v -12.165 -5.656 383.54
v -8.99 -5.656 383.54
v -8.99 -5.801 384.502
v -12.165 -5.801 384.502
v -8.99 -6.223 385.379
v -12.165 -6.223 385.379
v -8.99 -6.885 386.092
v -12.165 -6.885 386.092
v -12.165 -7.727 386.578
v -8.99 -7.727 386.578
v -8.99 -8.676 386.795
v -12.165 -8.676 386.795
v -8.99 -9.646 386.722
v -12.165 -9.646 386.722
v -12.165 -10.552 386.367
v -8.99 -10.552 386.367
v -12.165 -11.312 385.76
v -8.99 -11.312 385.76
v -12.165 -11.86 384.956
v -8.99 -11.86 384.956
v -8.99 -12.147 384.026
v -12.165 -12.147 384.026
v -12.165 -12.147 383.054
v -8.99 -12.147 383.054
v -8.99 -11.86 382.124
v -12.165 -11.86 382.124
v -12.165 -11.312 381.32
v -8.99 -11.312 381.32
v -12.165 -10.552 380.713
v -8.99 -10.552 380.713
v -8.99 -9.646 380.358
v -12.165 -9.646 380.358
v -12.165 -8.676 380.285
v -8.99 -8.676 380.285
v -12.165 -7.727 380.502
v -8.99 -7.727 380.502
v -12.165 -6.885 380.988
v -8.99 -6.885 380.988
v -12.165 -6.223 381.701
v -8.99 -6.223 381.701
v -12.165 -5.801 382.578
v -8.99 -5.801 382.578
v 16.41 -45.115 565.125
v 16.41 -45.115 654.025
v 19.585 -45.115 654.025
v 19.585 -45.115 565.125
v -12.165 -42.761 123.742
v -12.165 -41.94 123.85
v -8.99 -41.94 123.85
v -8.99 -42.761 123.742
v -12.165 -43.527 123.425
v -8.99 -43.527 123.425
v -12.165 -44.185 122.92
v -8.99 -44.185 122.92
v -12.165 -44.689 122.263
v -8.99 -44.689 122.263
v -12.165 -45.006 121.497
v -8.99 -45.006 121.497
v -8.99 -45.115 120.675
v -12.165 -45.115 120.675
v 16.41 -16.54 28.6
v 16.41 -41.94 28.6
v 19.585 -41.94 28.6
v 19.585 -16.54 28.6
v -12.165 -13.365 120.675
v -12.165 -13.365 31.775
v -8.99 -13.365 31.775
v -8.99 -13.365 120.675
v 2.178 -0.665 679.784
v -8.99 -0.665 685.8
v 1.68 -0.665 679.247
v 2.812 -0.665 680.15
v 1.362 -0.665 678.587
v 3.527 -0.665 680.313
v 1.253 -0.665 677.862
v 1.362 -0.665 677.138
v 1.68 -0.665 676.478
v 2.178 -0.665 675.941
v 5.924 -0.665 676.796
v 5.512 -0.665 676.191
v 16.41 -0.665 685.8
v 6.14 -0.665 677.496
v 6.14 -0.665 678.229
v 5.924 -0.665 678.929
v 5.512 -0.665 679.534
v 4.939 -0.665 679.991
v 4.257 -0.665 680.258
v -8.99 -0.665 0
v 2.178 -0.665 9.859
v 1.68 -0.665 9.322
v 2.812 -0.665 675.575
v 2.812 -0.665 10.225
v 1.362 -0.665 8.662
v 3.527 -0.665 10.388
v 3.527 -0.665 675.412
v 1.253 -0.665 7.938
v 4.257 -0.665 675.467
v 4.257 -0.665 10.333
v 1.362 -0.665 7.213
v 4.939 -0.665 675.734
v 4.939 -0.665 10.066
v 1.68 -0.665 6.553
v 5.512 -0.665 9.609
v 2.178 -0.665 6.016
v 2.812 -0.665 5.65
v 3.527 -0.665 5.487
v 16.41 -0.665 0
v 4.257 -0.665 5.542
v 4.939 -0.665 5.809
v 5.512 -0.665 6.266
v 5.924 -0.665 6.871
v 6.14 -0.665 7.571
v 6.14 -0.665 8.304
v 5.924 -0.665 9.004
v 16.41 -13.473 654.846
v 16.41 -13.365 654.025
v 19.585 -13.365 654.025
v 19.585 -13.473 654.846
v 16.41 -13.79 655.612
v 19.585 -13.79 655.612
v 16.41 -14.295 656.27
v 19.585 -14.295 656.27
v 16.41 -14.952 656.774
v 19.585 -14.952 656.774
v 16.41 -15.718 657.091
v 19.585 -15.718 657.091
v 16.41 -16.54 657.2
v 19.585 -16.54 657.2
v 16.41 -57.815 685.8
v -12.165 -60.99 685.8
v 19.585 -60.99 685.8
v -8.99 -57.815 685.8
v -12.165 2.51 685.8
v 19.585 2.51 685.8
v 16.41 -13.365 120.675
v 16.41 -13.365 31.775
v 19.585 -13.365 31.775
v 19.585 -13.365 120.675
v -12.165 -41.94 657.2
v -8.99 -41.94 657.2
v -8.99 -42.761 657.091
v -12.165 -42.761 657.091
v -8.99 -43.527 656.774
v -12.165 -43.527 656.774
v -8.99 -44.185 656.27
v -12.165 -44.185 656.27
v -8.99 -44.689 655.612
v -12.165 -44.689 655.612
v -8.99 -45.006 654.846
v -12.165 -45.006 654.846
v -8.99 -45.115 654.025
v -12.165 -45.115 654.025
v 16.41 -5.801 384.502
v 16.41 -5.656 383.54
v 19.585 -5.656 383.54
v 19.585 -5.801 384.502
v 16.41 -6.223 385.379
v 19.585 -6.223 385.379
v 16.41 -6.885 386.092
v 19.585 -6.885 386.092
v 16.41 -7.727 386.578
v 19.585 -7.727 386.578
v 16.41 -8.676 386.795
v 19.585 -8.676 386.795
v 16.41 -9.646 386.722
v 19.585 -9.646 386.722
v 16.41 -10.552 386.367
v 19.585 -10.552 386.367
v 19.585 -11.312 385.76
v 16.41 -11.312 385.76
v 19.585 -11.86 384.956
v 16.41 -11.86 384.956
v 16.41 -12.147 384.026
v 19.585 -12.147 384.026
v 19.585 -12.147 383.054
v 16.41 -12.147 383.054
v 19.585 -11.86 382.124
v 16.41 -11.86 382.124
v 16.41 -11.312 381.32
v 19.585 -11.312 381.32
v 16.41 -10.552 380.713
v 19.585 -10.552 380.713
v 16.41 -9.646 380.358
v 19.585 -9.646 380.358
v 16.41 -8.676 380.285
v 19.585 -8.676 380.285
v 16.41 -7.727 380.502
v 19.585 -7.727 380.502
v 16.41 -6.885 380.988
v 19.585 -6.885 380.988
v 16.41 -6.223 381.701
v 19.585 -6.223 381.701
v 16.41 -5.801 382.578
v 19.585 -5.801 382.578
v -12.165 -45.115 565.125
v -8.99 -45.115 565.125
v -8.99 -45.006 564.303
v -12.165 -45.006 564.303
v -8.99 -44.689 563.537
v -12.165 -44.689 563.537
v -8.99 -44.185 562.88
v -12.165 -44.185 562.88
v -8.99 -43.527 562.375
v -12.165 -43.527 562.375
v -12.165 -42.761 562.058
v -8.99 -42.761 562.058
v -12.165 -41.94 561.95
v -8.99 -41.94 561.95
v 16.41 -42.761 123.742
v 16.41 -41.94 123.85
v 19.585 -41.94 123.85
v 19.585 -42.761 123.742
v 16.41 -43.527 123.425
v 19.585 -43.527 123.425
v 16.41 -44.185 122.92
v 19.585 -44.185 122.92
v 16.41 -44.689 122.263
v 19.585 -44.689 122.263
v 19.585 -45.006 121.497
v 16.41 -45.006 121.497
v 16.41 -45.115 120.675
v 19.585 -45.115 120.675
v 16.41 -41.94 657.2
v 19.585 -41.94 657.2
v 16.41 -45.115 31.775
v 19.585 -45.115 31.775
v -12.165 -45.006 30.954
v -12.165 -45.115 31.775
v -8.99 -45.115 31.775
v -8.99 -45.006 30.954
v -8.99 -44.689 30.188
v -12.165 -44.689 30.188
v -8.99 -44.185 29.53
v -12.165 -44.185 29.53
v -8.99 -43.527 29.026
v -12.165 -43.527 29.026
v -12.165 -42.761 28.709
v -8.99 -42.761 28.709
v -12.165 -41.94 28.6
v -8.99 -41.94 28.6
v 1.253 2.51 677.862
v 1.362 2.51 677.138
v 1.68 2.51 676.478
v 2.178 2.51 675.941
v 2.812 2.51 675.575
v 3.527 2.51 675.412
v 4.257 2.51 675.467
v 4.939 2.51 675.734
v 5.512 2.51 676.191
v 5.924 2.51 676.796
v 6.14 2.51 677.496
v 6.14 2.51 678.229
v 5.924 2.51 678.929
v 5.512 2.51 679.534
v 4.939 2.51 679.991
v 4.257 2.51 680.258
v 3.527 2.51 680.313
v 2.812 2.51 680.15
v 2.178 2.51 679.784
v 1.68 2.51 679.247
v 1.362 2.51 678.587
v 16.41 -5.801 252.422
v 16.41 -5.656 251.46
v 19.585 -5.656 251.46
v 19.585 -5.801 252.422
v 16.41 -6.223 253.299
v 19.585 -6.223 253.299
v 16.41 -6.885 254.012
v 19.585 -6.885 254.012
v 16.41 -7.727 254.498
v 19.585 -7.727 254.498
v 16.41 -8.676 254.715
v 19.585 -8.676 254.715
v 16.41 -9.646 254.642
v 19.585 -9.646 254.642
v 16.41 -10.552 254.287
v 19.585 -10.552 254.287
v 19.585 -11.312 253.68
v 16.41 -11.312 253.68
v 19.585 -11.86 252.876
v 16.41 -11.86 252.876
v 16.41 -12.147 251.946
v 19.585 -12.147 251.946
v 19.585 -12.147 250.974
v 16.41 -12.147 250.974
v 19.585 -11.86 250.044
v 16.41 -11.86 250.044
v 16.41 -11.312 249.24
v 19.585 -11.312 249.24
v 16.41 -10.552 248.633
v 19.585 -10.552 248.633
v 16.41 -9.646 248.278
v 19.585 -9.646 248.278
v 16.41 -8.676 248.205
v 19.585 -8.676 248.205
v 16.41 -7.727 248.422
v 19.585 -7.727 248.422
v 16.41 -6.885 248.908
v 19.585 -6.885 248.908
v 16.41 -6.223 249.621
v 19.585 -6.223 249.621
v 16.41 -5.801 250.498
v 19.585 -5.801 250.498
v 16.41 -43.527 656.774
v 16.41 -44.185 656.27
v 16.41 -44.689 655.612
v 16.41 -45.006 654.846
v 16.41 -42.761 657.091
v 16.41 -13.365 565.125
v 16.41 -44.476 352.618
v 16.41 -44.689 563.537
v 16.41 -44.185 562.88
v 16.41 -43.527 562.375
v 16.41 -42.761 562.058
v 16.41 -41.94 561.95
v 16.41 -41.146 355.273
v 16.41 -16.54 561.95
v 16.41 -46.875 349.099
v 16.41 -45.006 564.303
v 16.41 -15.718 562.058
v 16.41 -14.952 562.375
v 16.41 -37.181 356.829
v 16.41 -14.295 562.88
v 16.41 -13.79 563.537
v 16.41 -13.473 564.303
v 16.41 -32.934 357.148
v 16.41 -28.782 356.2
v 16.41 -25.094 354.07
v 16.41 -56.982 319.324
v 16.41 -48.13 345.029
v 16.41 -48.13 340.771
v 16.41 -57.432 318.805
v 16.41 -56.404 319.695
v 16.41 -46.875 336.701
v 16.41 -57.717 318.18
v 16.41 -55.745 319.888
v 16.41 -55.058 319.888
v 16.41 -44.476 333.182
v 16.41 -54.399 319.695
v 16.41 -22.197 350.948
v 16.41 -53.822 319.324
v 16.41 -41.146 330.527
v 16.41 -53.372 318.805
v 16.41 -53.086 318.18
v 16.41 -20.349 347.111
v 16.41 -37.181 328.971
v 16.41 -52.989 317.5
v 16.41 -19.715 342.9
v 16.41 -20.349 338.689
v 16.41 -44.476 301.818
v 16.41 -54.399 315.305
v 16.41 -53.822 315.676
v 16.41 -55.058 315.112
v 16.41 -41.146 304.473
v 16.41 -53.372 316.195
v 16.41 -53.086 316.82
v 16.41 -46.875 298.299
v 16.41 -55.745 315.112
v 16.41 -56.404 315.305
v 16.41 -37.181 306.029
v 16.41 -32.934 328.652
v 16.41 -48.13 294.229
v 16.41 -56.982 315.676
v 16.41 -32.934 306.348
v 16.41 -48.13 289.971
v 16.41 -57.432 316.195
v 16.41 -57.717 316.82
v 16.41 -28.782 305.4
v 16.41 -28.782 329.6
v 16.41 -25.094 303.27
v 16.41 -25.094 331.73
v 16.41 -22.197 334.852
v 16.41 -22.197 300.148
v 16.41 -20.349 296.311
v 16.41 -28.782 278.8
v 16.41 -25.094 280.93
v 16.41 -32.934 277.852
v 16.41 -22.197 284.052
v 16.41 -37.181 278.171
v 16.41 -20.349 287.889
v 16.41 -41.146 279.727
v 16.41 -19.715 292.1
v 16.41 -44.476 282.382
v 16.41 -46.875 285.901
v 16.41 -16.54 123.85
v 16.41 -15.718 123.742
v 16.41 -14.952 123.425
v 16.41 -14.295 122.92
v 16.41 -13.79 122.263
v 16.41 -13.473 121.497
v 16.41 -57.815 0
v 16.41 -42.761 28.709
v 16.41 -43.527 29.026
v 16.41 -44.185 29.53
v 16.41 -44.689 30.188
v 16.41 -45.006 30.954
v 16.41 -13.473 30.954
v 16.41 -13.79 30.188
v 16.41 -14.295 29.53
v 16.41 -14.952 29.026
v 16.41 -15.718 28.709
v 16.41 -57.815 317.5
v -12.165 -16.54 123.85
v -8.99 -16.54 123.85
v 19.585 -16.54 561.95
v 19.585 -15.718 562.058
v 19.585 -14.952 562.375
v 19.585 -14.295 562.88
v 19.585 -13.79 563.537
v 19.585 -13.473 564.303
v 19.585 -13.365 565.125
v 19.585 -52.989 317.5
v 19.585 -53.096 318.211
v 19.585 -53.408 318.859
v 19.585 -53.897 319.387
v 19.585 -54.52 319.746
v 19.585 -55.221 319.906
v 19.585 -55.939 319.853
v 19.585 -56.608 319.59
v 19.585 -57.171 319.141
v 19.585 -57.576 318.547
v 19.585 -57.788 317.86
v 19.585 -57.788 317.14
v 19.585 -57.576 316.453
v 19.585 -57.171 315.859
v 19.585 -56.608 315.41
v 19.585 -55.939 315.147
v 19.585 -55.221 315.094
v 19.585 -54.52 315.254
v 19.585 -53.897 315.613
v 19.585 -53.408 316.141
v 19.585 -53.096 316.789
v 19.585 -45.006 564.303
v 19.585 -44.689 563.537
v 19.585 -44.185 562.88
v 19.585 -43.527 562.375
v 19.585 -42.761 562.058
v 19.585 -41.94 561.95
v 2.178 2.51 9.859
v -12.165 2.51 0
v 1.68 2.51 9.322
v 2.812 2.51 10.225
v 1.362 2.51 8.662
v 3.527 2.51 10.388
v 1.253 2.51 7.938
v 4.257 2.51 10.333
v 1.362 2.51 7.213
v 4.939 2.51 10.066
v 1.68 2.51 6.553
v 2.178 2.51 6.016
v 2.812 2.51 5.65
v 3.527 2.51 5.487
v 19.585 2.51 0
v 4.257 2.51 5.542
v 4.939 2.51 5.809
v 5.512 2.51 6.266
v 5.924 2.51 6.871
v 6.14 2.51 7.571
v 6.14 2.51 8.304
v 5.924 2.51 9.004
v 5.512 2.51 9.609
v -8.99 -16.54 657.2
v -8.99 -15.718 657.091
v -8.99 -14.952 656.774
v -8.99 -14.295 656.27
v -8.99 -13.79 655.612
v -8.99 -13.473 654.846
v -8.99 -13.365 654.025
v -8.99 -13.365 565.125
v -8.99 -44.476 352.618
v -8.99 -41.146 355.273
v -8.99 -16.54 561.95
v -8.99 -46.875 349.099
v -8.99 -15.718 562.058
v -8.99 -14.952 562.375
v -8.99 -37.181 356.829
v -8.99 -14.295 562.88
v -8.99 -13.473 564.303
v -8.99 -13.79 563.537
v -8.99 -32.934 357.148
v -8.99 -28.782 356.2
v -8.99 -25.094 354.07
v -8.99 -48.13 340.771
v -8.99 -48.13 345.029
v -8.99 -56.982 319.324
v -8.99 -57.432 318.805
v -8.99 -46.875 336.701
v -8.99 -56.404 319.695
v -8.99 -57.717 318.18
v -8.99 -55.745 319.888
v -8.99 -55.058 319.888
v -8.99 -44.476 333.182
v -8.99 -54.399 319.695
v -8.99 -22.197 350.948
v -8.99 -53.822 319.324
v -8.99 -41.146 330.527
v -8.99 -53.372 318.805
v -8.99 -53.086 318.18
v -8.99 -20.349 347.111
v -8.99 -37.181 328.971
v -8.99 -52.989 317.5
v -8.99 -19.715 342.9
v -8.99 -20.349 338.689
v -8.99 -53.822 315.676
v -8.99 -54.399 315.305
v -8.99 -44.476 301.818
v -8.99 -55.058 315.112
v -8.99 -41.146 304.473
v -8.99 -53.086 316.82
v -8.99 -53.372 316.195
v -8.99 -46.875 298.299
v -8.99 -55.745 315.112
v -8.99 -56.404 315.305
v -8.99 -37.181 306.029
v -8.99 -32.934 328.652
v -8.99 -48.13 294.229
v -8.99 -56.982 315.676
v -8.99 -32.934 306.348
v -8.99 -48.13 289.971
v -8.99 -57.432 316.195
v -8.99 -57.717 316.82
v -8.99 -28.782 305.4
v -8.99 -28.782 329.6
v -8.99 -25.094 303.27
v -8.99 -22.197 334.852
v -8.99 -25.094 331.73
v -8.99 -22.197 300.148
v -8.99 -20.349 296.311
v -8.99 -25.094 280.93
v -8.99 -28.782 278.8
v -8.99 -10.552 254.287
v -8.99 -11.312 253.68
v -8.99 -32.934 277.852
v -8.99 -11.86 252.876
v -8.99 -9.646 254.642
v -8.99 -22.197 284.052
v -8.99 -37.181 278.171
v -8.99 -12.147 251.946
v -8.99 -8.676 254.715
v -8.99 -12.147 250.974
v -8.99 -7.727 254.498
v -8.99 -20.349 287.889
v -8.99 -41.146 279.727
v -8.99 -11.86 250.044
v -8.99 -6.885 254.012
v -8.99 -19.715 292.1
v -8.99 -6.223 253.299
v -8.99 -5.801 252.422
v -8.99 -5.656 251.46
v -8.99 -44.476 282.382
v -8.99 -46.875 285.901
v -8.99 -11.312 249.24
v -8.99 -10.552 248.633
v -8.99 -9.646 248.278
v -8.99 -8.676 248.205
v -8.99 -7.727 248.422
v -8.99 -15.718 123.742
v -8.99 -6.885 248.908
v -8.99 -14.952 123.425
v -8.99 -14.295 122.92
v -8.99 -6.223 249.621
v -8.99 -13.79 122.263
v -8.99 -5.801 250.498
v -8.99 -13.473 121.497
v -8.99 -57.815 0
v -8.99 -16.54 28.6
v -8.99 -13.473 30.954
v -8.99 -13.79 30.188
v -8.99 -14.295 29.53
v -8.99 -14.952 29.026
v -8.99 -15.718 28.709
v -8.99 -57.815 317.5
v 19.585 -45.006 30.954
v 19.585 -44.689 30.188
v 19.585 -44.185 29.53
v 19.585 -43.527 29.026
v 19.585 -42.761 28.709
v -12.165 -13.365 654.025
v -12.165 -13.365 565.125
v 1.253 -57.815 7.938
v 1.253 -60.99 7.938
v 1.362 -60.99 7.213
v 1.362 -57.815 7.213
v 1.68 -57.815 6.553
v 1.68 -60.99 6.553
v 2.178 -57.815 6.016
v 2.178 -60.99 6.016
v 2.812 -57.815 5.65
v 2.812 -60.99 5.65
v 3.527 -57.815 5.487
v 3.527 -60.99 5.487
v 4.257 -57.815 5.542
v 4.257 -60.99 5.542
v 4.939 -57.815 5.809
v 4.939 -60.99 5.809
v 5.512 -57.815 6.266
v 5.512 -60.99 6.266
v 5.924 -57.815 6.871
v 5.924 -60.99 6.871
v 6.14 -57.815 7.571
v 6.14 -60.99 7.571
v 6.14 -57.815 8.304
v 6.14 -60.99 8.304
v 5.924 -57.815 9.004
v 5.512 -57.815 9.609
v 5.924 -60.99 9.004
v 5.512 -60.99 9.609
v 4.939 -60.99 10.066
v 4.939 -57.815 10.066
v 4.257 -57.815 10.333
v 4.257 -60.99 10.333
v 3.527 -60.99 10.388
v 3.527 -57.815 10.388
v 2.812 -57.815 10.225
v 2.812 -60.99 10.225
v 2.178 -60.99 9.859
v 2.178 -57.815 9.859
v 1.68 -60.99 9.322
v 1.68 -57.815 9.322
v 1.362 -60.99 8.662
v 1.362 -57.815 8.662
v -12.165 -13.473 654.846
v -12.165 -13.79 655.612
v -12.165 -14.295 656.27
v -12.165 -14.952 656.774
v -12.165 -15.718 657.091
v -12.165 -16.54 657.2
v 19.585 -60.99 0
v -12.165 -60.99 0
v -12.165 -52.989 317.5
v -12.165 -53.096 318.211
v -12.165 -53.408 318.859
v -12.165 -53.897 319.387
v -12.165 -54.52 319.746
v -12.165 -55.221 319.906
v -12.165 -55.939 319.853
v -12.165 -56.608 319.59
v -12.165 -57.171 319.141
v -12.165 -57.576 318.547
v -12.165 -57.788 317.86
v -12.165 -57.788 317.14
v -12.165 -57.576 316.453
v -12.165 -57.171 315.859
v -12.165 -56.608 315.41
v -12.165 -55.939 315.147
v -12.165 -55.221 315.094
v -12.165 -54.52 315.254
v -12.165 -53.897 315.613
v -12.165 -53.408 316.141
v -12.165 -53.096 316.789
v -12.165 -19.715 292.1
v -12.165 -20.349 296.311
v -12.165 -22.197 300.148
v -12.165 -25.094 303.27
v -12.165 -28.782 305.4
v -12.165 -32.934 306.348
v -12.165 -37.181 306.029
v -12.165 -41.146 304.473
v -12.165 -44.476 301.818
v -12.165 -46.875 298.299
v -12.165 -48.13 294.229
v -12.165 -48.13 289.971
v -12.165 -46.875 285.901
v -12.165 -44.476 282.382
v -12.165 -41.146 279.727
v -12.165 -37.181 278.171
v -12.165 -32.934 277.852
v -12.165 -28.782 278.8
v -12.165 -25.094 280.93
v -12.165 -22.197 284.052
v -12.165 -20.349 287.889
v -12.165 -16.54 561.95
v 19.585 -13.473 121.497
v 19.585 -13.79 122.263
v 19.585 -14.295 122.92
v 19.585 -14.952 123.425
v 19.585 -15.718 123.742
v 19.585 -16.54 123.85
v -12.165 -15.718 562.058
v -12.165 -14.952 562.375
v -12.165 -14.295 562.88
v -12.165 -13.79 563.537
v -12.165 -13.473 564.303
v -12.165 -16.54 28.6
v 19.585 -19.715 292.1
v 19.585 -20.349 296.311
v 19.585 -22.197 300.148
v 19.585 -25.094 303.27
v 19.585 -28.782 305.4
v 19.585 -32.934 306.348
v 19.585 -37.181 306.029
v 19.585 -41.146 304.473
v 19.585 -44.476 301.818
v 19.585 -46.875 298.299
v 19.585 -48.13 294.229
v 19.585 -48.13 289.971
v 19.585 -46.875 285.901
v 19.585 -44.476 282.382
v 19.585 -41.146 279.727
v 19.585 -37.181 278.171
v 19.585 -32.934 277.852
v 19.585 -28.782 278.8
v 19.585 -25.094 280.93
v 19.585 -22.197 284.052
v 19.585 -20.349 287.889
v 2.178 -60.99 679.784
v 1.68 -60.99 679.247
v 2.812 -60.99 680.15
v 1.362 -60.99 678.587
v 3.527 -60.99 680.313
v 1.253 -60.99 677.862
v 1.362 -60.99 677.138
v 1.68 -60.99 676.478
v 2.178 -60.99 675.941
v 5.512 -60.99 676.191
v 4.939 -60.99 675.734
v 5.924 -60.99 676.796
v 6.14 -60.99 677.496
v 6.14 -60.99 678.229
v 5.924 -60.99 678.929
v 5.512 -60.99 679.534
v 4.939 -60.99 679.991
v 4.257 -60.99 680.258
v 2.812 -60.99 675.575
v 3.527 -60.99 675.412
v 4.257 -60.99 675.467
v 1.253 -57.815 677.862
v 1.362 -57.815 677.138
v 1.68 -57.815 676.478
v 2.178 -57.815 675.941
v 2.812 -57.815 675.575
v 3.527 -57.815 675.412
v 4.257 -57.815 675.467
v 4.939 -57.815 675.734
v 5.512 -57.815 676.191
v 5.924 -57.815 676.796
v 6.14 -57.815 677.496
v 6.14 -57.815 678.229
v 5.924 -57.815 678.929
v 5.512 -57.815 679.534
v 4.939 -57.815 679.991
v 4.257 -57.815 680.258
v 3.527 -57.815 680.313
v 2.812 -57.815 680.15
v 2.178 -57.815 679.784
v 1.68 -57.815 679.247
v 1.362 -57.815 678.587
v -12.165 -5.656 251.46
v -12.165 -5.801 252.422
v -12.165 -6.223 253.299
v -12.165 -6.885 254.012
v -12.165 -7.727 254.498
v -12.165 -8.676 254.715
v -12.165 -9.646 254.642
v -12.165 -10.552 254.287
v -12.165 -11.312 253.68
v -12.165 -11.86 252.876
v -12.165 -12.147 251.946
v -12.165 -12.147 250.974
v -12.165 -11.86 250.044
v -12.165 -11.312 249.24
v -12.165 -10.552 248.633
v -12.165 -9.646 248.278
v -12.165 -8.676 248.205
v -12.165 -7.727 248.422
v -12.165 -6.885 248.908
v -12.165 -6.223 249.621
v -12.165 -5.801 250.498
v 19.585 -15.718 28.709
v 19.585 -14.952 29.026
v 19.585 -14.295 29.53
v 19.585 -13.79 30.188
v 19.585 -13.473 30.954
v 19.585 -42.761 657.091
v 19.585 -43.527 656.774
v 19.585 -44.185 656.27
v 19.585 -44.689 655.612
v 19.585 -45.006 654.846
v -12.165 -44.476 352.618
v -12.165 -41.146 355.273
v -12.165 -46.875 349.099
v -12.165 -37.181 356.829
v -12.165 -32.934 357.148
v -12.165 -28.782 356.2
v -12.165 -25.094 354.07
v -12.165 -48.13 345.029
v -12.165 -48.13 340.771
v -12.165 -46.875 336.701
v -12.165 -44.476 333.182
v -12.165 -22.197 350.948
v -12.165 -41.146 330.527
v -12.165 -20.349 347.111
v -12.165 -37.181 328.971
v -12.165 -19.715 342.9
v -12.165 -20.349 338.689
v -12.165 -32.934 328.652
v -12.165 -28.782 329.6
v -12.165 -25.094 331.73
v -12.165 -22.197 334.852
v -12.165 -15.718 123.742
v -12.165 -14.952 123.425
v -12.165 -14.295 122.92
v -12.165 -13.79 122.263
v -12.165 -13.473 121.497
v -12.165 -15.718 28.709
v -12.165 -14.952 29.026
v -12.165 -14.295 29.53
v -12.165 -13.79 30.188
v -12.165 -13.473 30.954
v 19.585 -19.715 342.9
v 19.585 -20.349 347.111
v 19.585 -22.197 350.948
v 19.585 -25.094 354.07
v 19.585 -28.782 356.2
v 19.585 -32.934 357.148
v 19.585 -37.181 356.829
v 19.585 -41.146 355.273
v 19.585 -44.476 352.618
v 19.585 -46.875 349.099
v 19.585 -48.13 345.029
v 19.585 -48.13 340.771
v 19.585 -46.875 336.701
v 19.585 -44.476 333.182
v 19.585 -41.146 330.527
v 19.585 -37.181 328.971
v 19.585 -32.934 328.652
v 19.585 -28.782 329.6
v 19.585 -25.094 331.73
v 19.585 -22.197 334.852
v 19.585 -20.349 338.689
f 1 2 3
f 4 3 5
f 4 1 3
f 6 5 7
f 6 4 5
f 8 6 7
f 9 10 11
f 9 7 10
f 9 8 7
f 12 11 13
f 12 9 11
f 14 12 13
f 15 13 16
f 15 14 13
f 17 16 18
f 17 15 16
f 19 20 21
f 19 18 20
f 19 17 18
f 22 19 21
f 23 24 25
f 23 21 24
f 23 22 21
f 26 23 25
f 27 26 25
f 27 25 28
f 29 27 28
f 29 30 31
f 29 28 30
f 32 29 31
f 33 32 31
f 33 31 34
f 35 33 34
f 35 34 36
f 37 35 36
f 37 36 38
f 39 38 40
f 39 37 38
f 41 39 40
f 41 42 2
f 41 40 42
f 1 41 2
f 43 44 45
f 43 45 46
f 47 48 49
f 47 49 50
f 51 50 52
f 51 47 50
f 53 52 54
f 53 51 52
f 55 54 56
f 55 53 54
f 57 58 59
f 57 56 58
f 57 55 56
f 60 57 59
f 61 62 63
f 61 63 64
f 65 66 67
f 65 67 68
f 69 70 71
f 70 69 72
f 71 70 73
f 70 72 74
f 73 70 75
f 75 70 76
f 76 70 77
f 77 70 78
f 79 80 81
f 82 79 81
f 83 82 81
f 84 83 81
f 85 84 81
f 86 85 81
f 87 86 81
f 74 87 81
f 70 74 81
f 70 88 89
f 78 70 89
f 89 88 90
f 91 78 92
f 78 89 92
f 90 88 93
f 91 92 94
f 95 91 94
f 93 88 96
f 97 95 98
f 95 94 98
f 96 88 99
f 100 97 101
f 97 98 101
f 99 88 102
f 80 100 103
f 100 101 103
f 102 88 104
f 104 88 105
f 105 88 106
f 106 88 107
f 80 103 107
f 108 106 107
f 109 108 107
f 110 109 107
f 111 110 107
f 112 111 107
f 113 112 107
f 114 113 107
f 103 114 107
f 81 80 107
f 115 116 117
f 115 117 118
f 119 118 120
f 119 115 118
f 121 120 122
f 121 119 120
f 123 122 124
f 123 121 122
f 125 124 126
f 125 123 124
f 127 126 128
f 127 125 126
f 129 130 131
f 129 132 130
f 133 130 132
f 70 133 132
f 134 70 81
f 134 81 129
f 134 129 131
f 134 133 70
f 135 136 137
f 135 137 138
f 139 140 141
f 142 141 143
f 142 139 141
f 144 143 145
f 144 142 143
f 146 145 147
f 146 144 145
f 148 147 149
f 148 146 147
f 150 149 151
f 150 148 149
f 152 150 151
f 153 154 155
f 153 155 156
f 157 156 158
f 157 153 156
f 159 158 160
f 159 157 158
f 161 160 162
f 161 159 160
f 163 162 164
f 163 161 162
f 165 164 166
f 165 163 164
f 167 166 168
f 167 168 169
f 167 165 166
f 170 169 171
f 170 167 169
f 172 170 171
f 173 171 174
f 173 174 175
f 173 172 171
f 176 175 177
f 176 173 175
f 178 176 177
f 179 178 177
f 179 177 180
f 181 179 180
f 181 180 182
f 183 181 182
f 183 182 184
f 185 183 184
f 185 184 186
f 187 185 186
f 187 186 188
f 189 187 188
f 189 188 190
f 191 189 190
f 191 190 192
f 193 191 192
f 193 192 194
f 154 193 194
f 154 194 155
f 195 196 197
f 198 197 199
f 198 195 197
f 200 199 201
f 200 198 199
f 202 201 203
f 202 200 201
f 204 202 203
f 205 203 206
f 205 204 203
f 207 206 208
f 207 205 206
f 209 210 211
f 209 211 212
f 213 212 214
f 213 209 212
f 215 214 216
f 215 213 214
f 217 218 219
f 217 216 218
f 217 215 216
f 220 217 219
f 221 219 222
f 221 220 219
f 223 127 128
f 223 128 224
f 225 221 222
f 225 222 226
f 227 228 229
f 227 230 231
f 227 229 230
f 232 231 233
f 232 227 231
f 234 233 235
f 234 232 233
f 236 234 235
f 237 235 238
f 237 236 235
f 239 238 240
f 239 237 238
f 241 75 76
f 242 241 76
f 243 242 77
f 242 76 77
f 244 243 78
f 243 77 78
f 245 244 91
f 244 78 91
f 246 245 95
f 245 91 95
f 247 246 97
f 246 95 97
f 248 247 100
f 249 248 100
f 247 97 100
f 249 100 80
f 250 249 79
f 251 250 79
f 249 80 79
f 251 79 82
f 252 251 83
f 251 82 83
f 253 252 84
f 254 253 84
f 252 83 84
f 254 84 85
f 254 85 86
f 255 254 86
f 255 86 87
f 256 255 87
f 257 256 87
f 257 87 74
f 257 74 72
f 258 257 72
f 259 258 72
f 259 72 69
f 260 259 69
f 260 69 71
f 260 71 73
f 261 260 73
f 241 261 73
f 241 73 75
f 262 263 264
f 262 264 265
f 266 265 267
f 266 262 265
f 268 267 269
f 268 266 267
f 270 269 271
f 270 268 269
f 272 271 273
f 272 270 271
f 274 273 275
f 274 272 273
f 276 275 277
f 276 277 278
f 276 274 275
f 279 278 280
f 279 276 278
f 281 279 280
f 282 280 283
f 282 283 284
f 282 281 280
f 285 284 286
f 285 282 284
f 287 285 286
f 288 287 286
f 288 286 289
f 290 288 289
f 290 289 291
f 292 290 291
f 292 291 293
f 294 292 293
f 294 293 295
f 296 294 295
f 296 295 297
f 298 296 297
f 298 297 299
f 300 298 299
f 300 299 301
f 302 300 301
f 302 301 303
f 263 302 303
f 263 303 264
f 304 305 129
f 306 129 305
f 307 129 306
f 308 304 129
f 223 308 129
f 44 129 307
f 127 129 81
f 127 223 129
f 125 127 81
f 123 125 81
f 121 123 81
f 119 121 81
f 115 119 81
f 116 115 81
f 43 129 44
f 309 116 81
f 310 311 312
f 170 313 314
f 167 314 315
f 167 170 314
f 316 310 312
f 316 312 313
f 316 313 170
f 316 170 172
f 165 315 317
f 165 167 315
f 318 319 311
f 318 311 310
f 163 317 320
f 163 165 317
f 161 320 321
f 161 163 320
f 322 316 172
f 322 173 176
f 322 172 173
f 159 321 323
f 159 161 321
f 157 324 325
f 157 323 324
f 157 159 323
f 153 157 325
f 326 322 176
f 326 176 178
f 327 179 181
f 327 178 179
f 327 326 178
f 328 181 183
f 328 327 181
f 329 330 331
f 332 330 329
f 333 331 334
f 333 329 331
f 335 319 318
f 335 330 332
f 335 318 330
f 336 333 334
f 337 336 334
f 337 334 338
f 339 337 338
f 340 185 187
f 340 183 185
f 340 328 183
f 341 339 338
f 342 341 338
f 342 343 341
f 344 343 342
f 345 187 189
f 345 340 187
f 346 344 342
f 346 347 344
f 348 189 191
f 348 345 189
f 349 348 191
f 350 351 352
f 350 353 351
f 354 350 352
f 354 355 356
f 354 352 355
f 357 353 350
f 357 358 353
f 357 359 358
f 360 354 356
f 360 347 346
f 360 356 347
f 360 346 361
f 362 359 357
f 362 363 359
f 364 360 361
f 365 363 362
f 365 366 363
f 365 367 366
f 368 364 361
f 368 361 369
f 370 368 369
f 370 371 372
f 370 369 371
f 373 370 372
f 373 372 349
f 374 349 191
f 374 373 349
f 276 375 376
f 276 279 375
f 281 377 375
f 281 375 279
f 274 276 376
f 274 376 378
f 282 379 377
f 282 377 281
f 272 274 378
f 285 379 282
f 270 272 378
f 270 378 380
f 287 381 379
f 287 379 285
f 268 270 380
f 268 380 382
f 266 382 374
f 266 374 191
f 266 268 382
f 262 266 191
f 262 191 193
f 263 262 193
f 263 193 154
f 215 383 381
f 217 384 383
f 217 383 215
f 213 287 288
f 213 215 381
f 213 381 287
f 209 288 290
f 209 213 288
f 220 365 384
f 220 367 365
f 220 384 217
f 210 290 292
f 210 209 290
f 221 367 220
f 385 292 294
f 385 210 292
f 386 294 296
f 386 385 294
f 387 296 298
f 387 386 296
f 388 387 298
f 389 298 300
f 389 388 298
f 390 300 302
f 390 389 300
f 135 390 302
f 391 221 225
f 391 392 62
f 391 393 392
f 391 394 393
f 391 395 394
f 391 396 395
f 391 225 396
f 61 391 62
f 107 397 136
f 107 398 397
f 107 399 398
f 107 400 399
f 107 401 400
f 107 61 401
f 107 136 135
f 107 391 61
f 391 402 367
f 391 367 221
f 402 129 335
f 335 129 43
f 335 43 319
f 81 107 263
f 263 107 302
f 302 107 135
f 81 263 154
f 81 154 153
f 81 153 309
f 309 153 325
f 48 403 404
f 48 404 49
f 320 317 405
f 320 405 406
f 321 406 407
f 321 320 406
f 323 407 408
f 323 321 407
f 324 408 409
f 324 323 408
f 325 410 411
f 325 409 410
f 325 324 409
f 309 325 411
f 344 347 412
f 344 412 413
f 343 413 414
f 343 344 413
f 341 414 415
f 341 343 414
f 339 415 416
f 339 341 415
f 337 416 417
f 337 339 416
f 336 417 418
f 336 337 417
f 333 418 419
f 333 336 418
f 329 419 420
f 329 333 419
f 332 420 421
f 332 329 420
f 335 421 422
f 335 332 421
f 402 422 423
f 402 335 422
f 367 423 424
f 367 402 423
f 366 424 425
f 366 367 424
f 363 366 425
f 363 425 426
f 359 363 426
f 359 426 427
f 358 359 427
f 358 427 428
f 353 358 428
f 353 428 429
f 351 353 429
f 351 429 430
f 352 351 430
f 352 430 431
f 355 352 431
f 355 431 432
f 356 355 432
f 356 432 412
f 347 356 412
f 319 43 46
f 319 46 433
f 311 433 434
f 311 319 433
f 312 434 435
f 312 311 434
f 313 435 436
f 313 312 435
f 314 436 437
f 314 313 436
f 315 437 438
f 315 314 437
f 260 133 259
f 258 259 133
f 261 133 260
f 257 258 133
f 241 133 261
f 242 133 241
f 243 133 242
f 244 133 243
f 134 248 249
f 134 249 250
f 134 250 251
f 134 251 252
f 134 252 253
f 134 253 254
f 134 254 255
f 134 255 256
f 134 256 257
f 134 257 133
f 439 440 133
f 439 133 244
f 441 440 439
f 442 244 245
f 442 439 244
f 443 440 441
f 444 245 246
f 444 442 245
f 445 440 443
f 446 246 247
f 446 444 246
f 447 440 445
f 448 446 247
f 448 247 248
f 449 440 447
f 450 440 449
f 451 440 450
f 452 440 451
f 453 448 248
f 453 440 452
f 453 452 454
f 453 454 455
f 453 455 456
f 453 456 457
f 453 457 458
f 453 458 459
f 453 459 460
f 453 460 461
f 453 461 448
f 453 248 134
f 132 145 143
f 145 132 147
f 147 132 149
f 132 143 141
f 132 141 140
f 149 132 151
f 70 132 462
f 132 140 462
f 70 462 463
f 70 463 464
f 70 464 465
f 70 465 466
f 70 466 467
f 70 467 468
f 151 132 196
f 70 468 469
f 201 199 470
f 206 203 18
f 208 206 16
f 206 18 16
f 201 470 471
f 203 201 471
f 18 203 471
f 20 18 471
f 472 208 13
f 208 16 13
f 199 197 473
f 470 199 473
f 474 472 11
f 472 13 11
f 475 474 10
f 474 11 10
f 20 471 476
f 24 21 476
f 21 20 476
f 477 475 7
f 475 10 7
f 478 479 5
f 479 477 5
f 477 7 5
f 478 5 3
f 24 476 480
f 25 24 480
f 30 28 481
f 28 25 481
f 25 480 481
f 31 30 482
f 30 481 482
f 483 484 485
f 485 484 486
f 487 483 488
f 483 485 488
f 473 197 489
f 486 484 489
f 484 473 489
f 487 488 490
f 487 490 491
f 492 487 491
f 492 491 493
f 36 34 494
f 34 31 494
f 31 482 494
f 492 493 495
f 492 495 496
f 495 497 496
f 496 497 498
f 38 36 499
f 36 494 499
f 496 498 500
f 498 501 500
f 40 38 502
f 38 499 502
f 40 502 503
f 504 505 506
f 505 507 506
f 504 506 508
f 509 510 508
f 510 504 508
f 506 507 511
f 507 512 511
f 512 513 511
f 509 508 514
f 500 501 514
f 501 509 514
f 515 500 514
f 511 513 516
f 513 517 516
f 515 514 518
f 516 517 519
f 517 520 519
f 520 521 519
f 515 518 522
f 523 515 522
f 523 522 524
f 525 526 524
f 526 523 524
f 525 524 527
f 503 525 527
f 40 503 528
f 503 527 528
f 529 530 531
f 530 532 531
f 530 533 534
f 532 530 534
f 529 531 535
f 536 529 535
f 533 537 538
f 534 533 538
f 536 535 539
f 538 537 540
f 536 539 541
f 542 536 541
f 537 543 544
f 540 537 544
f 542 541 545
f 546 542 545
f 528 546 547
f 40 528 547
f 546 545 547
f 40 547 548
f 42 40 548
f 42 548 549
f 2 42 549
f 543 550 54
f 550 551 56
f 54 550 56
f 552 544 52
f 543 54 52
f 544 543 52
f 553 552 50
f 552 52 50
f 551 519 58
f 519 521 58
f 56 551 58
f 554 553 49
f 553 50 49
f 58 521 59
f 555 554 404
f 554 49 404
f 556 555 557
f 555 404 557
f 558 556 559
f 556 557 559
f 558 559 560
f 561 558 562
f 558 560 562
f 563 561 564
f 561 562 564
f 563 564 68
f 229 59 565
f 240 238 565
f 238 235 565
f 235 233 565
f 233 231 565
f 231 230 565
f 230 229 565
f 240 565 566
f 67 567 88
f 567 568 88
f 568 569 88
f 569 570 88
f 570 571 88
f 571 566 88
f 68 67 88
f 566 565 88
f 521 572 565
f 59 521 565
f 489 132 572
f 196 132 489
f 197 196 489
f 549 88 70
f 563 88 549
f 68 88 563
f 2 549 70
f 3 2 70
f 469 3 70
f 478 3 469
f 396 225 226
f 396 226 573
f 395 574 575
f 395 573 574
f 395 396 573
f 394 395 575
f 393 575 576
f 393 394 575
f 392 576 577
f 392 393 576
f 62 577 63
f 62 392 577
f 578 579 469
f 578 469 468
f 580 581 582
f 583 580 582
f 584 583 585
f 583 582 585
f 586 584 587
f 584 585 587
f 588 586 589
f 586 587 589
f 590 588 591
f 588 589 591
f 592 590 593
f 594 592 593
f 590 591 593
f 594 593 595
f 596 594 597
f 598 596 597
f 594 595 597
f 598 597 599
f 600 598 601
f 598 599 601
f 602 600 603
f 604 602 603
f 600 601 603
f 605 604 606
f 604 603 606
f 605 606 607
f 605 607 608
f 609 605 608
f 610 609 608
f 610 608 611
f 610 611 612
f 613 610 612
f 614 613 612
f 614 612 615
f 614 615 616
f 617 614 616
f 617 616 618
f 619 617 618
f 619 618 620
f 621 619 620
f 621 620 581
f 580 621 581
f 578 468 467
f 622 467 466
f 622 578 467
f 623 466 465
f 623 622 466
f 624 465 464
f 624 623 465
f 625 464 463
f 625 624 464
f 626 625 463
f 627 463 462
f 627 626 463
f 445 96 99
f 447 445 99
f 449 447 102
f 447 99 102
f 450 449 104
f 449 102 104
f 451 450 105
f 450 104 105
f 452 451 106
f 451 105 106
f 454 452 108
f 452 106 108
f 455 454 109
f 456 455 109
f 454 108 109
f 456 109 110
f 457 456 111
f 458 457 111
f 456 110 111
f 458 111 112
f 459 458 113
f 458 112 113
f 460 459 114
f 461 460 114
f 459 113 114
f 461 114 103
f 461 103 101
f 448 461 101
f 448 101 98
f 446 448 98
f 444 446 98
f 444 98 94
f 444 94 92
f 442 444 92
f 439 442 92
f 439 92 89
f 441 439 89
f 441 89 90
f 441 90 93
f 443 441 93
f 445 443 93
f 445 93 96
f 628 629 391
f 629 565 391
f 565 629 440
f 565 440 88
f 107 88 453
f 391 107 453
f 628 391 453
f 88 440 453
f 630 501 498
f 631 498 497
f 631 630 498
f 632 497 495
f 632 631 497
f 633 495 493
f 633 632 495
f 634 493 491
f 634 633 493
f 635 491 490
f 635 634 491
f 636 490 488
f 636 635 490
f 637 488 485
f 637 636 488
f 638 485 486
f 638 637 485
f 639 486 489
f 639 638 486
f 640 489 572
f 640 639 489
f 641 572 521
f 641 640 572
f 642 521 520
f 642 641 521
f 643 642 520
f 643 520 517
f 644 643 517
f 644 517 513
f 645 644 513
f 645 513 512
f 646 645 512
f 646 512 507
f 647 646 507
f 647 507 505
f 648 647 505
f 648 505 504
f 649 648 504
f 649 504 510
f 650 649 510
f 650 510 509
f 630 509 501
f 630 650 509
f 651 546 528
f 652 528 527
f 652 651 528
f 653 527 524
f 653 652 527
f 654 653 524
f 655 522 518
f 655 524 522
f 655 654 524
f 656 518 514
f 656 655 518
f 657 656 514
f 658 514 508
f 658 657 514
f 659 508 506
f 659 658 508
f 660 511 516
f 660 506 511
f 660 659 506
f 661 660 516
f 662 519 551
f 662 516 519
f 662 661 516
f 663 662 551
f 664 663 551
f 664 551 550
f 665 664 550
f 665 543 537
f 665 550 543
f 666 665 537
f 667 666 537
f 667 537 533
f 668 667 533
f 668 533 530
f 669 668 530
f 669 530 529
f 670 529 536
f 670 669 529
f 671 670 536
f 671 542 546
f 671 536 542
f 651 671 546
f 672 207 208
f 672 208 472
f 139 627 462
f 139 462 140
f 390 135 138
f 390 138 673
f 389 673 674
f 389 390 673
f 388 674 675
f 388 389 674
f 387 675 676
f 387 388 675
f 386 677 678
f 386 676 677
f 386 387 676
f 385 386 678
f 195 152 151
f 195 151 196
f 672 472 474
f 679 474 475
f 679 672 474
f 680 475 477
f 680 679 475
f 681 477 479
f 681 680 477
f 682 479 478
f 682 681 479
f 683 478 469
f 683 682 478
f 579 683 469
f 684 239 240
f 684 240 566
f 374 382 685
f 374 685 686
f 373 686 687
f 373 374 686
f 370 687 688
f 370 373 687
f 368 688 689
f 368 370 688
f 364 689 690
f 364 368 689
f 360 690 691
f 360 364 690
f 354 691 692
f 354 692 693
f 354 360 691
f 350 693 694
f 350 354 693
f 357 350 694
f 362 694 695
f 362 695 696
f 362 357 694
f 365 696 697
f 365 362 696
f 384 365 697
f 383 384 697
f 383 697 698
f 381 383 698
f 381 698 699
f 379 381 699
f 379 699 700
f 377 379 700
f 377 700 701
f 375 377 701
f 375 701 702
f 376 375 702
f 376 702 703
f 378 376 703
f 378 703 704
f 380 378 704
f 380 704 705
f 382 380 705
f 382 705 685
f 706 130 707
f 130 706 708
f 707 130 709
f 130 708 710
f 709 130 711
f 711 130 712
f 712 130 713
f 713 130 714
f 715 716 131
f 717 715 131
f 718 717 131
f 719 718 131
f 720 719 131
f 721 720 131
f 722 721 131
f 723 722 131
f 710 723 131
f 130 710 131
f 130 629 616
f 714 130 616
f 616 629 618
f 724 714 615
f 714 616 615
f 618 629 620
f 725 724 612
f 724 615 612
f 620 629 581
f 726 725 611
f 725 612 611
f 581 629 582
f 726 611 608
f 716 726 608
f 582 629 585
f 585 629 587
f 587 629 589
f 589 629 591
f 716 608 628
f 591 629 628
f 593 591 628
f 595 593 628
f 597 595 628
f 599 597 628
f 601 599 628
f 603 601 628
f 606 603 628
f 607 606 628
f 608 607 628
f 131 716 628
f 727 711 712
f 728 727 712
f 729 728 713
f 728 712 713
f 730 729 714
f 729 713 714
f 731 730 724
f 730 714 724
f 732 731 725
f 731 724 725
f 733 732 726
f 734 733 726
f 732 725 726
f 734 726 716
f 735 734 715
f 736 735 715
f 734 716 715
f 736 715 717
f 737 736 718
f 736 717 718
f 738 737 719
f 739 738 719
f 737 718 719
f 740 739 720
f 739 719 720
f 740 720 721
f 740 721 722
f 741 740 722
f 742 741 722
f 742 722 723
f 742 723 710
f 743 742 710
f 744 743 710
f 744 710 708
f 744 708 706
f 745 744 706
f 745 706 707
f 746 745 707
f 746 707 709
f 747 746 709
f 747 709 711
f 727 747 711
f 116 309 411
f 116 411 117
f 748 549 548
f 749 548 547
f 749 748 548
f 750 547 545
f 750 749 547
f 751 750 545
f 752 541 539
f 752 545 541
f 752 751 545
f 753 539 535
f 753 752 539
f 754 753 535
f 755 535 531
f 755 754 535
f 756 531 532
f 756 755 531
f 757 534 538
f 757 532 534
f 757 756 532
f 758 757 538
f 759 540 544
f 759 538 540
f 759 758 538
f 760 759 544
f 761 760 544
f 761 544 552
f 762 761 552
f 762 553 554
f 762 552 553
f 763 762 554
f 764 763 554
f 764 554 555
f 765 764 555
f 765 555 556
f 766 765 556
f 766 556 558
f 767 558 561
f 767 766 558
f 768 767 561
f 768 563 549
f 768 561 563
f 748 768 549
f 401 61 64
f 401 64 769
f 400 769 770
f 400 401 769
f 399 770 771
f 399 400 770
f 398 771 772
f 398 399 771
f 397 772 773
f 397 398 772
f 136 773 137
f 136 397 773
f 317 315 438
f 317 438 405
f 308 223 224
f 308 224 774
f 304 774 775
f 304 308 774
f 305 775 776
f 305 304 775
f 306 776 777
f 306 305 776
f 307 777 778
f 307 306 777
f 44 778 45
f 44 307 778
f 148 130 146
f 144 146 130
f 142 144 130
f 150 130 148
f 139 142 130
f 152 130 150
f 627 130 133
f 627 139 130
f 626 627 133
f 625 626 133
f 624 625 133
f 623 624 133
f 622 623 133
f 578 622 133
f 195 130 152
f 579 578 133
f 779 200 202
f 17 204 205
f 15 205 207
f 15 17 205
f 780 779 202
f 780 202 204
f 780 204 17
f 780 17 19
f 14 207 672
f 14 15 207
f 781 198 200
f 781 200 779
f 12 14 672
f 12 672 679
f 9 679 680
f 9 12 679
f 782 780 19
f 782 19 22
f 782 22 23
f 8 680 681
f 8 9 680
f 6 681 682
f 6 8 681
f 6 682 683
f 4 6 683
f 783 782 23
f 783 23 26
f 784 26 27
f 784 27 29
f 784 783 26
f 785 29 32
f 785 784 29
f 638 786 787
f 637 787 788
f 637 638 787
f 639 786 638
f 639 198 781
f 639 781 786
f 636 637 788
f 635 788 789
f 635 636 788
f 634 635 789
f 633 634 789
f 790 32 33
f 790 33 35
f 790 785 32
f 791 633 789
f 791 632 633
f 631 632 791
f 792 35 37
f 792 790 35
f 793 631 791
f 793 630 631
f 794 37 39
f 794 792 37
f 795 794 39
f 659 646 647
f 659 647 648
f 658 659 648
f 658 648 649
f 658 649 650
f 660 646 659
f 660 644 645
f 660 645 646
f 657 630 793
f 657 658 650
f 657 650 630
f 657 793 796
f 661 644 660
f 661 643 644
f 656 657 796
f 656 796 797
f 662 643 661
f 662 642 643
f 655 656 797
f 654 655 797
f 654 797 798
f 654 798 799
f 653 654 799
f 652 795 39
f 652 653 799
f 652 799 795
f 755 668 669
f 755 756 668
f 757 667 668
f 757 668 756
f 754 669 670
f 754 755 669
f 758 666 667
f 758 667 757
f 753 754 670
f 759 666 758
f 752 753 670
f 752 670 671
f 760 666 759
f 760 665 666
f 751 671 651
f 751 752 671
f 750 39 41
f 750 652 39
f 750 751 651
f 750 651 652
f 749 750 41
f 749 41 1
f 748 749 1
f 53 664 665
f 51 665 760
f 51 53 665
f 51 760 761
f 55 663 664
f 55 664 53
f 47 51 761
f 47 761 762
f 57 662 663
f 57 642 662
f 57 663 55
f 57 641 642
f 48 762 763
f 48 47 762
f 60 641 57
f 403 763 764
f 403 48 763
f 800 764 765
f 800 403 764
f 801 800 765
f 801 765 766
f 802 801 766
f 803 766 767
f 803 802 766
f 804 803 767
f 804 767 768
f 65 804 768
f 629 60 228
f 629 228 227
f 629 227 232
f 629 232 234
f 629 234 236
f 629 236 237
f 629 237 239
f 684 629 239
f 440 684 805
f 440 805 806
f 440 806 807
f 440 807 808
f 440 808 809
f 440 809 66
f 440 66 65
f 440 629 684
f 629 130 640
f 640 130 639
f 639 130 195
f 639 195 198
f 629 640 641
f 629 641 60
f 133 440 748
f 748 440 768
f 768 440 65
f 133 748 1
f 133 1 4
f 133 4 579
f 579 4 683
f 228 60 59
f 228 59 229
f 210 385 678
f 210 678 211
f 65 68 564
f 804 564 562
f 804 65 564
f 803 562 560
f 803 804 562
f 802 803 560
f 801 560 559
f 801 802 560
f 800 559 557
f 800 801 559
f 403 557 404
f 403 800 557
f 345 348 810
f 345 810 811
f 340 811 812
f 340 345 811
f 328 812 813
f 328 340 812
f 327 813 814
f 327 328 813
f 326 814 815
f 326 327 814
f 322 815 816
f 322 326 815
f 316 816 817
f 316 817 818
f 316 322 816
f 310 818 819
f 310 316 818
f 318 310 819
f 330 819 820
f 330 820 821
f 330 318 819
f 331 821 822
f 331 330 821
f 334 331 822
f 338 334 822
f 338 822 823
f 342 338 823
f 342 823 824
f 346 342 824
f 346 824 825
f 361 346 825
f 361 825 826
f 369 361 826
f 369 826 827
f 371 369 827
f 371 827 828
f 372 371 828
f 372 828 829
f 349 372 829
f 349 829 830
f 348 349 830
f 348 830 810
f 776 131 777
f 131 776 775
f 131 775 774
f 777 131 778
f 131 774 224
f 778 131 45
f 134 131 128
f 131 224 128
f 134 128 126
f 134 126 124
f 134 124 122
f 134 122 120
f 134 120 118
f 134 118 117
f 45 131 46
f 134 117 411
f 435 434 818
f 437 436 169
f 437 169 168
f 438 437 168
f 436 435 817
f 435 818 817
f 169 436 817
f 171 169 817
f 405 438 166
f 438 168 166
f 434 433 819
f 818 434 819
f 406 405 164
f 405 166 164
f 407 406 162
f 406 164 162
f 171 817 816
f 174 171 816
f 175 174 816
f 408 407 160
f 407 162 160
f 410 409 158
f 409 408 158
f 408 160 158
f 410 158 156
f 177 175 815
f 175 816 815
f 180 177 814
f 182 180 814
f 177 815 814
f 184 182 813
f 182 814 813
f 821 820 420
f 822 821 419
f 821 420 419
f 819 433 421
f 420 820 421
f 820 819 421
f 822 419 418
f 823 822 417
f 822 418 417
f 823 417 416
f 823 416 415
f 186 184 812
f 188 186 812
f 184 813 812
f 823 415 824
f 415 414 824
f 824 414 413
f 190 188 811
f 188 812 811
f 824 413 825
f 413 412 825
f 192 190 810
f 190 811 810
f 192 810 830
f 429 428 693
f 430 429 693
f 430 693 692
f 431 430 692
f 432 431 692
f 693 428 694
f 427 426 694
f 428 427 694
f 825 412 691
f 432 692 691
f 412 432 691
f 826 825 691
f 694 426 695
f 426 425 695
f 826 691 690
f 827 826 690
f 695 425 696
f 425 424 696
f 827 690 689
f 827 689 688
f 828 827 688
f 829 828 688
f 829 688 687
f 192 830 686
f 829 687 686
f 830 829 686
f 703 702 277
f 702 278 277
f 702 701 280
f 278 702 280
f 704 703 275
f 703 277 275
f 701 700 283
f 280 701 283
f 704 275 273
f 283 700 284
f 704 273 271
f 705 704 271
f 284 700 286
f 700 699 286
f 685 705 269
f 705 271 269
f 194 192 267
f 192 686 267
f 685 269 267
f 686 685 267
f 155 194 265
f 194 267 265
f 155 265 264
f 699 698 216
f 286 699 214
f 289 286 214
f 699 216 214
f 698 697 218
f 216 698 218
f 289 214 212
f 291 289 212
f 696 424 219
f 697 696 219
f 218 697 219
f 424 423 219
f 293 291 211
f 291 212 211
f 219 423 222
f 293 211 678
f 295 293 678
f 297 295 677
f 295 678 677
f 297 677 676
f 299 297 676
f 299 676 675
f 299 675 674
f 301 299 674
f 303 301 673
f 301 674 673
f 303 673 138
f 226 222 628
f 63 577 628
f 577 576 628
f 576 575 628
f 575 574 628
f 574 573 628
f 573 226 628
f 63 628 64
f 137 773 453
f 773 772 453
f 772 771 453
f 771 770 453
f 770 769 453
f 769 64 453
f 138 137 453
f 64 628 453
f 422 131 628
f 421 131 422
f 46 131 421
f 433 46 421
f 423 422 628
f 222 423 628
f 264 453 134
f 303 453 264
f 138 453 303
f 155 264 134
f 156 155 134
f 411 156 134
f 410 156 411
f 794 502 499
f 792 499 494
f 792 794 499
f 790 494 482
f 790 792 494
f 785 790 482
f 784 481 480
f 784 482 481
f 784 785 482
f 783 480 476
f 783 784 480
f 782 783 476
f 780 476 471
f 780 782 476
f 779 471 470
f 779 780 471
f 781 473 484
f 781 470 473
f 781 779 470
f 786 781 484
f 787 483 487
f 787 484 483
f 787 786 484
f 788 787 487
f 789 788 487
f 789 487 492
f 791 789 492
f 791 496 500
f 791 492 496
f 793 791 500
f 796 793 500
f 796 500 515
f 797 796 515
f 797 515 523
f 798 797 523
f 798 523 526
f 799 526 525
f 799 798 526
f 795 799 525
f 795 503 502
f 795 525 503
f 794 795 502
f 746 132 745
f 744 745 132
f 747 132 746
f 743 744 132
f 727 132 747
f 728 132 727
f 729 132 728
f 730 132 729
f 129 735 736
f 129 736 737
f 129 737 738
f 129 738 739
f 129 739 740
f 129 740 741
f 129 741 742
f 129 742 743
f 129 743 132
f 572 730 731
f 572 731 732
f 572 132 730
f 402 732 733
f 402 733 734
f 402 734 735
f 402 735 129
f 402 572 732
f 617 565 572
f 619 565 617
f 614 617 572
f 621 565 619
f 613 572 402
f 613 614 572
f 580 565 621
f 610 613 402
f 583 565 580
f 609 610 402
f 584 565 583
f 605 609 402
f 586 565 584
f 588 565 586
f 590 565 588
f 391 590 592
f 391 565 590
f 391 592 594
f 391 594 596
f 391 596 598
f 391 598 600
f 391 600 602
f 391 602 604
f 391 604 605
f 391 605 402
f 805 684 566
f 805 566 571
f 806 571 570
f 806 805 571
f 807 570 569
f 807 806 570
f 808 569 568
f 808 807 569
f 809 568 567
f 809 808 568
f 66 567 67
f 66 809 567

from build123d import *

# Parameters (mm, degrees)
SKETCH1_W                    = 31.75
SKETCH1_H                    = 63.5
SKETCH1_W_2                  = 25.4
SKETCH1_H_2                  = 57.15
BOSS_EXTRUDE1_DEPTH          = 685.8
CUT_EXTRUDE1_REACH           = 691.238
F_10_0_1935_DIAMETER_HOLE1_D = 4.9149
CUT_EXTRUDE2_START           = -31.75
SKETCH6_R                    = 14.2875
SKETCH6_R_2                  = 3.2639
SKETCH6_R_3                  = 2.413
CUT_EXTRUDE2_DEPTH           = 31.75


with BuildPart() as part:
    # Sketch1 → Boss-Extrude1 (new body)
    with BuildSketch(Plane.XY):
        with Locations((3.710272719, -29.23968021)):
            Rectangle(SKETCH1_W, SKETCH1_H)
        with Locations((3.710272719, -29.23968021)):
            Rectangle(SKETCH1_W_2, SKETCH1_H_2, mode=Mode.SUBTRACT)
    extrude(amount=BOSS_EXTRUDE1_DEPTH)

    # Cut-Extrude1: up to this face of the body (flat: up to its plane)
    cut_extrude1_end = Plane(part.part.faces().sort_by_distance((19.585272719, -29.23968021, 342.9))[0])
    # Sketch3 → Cut-Extrude1 (cut, up to the picked face)
    with BuildSketch(Plane.ZY.offset(12.164727281), mode=Mode.PRIVATE) as cut_extrude1_sk1:
        with BuildLine():
            Line((31.7754, -13.36468021), (120.6754, -13.36468021))
            ThreePointArc((120.6754, -13.36468021), (122.92046403, -14.294616179), (123.8504, -16.53968021))
            Line((123.8504, -16.53968021), (123.8504, -41.93968021))
            ThreePointArc((123.8504, -41.93968021), (122.92046403, -44.18474424), (120.6754, -45.11468021))
            Line((120.6754, -45.11468021), (31.7754, -45.11468021))
            ThreePointArc((31.7754, -45.11468021), (29.53033597, -44.18474424), (28.6004, -41.93968021))
            Line((28.6004, -41.93968021), (28.6004, -16.53968021))
            ThreePointArc((28.6004, -16.53968021), (29.53033597, -14.294616179), (31.7754, -13.36468021))
        make_face()
    cut_extrude1_tool1 = split(extrude(cut_extrude1_sk1.sketch, amount=-CUT_EXTRUDE1_REACH, mode=Mode.PRIVATE), bisect_by=cut_extrude1_end, keep=Keep.BOTH, mode=Mode.PRIVATE)
    # Sketch3 → Cut-Extrude1 (cut, up to the picked face)
    with BuildSketch(Plane.ZY.offset(12.164727281), mode=Mode.PRIVATE) as cut_extrude1_sk2:
        with BuildLine():
            ThreePointArc((657.1996, -41.93968021), (656.26966403, -44.18474424), (654.0246, -45.11468021))
            Line((654.0246, -45.11468021), (565.1246, -45.11468021))
            ThreePointArc((565.1246, -45.11468021), (562.87953597, -44.18474424), (561.9496, -41.93968021))
            Line((561.9496, -41.93968021), (561.9496, -16.53968021))
            ThreePointArc((561.9496, -16.53968021), (562.87953597, -14.294616179), (565.1246, -13.36468021))
            Line((565.1246, -13.36468021), (654.0246, -13.36468021))
            ThreePointArc((654.0246, -13.36468021), (656.26966403, -14.294616179), (657.1996, -16.53968021))
            Line((657.1996, -16.53968021), (657.1996, -41.93968021))
        make_face()
    cut_extrude1_tool2 = split(extrude(cut_extrude1_sk2.sketch, amount=-CUT_EXTRUDE1_REACH, mode=Mode.PRIVATE), bisect_by=cut_extrude1_end, keep=Keep.BOTH, mode=Mode.PRIVATE)
    add(cut_extrude1_tool1.solids().sort_by(Axis((-12.164727, -29.23968, 76.2254), (1, 0, 0)))[0], mode=Mode.SUBTRACT)
    add(cut_extrude1_tool2.solids().sort_by(Axis((-12.164727, -29.23968, 609.5746), (1, 0, 0)))[0], mode=Mode.SUBTRACT)

    # #10 (0.1935) Diameter Hole1 (through all)
    with Locations(Plane(origin=(3.710272719, 2.51031979, 677.8625), x_dir=(1, 0, 0), z_dir=(0, 1, 0))):
        with Locations((0, 0), (0, 669.925)):
            Hole(F_10_0_1935_DIAMETER_HOLE1_D / 2)

    # Sketch6 → Cut-Extrude2 (cut)
    with BuildSketch(Plane(origin=(19.585272719, 0, 0), x_dir=(0, 0, -1), z_dir=(1, 0, 0)).offset(CUT_EXTRUDE2_START)):
        with Locations(Location((-342.9, -34.00218021, 0), (0, 0, 90))):
            Circle(SKETCH6_R)
        with Locations(Location((-383.54, -8.91968021, 0), (0, 0, 90))):
            Circle(SKETCH6_R_2)
        with Locations(Location((-251.46, -8.91968021, 0), (0, 0, 90))):
            Circle(SKETCH6_R_2)
        with Locations(Location((-317.5, -55.40168021, 0), (0, 0, 90))):
            Circle(SKETCH6_R_3)
        with Locations(Location((-292.1, -34.00218021, 0), (0, 0, 90))):
            Circle(SKETCH6_R)
    extrude(amount=CUT_EXTRUDE2_DEPTH, mode=Mode.SUBTRACT)


solid = part.part
